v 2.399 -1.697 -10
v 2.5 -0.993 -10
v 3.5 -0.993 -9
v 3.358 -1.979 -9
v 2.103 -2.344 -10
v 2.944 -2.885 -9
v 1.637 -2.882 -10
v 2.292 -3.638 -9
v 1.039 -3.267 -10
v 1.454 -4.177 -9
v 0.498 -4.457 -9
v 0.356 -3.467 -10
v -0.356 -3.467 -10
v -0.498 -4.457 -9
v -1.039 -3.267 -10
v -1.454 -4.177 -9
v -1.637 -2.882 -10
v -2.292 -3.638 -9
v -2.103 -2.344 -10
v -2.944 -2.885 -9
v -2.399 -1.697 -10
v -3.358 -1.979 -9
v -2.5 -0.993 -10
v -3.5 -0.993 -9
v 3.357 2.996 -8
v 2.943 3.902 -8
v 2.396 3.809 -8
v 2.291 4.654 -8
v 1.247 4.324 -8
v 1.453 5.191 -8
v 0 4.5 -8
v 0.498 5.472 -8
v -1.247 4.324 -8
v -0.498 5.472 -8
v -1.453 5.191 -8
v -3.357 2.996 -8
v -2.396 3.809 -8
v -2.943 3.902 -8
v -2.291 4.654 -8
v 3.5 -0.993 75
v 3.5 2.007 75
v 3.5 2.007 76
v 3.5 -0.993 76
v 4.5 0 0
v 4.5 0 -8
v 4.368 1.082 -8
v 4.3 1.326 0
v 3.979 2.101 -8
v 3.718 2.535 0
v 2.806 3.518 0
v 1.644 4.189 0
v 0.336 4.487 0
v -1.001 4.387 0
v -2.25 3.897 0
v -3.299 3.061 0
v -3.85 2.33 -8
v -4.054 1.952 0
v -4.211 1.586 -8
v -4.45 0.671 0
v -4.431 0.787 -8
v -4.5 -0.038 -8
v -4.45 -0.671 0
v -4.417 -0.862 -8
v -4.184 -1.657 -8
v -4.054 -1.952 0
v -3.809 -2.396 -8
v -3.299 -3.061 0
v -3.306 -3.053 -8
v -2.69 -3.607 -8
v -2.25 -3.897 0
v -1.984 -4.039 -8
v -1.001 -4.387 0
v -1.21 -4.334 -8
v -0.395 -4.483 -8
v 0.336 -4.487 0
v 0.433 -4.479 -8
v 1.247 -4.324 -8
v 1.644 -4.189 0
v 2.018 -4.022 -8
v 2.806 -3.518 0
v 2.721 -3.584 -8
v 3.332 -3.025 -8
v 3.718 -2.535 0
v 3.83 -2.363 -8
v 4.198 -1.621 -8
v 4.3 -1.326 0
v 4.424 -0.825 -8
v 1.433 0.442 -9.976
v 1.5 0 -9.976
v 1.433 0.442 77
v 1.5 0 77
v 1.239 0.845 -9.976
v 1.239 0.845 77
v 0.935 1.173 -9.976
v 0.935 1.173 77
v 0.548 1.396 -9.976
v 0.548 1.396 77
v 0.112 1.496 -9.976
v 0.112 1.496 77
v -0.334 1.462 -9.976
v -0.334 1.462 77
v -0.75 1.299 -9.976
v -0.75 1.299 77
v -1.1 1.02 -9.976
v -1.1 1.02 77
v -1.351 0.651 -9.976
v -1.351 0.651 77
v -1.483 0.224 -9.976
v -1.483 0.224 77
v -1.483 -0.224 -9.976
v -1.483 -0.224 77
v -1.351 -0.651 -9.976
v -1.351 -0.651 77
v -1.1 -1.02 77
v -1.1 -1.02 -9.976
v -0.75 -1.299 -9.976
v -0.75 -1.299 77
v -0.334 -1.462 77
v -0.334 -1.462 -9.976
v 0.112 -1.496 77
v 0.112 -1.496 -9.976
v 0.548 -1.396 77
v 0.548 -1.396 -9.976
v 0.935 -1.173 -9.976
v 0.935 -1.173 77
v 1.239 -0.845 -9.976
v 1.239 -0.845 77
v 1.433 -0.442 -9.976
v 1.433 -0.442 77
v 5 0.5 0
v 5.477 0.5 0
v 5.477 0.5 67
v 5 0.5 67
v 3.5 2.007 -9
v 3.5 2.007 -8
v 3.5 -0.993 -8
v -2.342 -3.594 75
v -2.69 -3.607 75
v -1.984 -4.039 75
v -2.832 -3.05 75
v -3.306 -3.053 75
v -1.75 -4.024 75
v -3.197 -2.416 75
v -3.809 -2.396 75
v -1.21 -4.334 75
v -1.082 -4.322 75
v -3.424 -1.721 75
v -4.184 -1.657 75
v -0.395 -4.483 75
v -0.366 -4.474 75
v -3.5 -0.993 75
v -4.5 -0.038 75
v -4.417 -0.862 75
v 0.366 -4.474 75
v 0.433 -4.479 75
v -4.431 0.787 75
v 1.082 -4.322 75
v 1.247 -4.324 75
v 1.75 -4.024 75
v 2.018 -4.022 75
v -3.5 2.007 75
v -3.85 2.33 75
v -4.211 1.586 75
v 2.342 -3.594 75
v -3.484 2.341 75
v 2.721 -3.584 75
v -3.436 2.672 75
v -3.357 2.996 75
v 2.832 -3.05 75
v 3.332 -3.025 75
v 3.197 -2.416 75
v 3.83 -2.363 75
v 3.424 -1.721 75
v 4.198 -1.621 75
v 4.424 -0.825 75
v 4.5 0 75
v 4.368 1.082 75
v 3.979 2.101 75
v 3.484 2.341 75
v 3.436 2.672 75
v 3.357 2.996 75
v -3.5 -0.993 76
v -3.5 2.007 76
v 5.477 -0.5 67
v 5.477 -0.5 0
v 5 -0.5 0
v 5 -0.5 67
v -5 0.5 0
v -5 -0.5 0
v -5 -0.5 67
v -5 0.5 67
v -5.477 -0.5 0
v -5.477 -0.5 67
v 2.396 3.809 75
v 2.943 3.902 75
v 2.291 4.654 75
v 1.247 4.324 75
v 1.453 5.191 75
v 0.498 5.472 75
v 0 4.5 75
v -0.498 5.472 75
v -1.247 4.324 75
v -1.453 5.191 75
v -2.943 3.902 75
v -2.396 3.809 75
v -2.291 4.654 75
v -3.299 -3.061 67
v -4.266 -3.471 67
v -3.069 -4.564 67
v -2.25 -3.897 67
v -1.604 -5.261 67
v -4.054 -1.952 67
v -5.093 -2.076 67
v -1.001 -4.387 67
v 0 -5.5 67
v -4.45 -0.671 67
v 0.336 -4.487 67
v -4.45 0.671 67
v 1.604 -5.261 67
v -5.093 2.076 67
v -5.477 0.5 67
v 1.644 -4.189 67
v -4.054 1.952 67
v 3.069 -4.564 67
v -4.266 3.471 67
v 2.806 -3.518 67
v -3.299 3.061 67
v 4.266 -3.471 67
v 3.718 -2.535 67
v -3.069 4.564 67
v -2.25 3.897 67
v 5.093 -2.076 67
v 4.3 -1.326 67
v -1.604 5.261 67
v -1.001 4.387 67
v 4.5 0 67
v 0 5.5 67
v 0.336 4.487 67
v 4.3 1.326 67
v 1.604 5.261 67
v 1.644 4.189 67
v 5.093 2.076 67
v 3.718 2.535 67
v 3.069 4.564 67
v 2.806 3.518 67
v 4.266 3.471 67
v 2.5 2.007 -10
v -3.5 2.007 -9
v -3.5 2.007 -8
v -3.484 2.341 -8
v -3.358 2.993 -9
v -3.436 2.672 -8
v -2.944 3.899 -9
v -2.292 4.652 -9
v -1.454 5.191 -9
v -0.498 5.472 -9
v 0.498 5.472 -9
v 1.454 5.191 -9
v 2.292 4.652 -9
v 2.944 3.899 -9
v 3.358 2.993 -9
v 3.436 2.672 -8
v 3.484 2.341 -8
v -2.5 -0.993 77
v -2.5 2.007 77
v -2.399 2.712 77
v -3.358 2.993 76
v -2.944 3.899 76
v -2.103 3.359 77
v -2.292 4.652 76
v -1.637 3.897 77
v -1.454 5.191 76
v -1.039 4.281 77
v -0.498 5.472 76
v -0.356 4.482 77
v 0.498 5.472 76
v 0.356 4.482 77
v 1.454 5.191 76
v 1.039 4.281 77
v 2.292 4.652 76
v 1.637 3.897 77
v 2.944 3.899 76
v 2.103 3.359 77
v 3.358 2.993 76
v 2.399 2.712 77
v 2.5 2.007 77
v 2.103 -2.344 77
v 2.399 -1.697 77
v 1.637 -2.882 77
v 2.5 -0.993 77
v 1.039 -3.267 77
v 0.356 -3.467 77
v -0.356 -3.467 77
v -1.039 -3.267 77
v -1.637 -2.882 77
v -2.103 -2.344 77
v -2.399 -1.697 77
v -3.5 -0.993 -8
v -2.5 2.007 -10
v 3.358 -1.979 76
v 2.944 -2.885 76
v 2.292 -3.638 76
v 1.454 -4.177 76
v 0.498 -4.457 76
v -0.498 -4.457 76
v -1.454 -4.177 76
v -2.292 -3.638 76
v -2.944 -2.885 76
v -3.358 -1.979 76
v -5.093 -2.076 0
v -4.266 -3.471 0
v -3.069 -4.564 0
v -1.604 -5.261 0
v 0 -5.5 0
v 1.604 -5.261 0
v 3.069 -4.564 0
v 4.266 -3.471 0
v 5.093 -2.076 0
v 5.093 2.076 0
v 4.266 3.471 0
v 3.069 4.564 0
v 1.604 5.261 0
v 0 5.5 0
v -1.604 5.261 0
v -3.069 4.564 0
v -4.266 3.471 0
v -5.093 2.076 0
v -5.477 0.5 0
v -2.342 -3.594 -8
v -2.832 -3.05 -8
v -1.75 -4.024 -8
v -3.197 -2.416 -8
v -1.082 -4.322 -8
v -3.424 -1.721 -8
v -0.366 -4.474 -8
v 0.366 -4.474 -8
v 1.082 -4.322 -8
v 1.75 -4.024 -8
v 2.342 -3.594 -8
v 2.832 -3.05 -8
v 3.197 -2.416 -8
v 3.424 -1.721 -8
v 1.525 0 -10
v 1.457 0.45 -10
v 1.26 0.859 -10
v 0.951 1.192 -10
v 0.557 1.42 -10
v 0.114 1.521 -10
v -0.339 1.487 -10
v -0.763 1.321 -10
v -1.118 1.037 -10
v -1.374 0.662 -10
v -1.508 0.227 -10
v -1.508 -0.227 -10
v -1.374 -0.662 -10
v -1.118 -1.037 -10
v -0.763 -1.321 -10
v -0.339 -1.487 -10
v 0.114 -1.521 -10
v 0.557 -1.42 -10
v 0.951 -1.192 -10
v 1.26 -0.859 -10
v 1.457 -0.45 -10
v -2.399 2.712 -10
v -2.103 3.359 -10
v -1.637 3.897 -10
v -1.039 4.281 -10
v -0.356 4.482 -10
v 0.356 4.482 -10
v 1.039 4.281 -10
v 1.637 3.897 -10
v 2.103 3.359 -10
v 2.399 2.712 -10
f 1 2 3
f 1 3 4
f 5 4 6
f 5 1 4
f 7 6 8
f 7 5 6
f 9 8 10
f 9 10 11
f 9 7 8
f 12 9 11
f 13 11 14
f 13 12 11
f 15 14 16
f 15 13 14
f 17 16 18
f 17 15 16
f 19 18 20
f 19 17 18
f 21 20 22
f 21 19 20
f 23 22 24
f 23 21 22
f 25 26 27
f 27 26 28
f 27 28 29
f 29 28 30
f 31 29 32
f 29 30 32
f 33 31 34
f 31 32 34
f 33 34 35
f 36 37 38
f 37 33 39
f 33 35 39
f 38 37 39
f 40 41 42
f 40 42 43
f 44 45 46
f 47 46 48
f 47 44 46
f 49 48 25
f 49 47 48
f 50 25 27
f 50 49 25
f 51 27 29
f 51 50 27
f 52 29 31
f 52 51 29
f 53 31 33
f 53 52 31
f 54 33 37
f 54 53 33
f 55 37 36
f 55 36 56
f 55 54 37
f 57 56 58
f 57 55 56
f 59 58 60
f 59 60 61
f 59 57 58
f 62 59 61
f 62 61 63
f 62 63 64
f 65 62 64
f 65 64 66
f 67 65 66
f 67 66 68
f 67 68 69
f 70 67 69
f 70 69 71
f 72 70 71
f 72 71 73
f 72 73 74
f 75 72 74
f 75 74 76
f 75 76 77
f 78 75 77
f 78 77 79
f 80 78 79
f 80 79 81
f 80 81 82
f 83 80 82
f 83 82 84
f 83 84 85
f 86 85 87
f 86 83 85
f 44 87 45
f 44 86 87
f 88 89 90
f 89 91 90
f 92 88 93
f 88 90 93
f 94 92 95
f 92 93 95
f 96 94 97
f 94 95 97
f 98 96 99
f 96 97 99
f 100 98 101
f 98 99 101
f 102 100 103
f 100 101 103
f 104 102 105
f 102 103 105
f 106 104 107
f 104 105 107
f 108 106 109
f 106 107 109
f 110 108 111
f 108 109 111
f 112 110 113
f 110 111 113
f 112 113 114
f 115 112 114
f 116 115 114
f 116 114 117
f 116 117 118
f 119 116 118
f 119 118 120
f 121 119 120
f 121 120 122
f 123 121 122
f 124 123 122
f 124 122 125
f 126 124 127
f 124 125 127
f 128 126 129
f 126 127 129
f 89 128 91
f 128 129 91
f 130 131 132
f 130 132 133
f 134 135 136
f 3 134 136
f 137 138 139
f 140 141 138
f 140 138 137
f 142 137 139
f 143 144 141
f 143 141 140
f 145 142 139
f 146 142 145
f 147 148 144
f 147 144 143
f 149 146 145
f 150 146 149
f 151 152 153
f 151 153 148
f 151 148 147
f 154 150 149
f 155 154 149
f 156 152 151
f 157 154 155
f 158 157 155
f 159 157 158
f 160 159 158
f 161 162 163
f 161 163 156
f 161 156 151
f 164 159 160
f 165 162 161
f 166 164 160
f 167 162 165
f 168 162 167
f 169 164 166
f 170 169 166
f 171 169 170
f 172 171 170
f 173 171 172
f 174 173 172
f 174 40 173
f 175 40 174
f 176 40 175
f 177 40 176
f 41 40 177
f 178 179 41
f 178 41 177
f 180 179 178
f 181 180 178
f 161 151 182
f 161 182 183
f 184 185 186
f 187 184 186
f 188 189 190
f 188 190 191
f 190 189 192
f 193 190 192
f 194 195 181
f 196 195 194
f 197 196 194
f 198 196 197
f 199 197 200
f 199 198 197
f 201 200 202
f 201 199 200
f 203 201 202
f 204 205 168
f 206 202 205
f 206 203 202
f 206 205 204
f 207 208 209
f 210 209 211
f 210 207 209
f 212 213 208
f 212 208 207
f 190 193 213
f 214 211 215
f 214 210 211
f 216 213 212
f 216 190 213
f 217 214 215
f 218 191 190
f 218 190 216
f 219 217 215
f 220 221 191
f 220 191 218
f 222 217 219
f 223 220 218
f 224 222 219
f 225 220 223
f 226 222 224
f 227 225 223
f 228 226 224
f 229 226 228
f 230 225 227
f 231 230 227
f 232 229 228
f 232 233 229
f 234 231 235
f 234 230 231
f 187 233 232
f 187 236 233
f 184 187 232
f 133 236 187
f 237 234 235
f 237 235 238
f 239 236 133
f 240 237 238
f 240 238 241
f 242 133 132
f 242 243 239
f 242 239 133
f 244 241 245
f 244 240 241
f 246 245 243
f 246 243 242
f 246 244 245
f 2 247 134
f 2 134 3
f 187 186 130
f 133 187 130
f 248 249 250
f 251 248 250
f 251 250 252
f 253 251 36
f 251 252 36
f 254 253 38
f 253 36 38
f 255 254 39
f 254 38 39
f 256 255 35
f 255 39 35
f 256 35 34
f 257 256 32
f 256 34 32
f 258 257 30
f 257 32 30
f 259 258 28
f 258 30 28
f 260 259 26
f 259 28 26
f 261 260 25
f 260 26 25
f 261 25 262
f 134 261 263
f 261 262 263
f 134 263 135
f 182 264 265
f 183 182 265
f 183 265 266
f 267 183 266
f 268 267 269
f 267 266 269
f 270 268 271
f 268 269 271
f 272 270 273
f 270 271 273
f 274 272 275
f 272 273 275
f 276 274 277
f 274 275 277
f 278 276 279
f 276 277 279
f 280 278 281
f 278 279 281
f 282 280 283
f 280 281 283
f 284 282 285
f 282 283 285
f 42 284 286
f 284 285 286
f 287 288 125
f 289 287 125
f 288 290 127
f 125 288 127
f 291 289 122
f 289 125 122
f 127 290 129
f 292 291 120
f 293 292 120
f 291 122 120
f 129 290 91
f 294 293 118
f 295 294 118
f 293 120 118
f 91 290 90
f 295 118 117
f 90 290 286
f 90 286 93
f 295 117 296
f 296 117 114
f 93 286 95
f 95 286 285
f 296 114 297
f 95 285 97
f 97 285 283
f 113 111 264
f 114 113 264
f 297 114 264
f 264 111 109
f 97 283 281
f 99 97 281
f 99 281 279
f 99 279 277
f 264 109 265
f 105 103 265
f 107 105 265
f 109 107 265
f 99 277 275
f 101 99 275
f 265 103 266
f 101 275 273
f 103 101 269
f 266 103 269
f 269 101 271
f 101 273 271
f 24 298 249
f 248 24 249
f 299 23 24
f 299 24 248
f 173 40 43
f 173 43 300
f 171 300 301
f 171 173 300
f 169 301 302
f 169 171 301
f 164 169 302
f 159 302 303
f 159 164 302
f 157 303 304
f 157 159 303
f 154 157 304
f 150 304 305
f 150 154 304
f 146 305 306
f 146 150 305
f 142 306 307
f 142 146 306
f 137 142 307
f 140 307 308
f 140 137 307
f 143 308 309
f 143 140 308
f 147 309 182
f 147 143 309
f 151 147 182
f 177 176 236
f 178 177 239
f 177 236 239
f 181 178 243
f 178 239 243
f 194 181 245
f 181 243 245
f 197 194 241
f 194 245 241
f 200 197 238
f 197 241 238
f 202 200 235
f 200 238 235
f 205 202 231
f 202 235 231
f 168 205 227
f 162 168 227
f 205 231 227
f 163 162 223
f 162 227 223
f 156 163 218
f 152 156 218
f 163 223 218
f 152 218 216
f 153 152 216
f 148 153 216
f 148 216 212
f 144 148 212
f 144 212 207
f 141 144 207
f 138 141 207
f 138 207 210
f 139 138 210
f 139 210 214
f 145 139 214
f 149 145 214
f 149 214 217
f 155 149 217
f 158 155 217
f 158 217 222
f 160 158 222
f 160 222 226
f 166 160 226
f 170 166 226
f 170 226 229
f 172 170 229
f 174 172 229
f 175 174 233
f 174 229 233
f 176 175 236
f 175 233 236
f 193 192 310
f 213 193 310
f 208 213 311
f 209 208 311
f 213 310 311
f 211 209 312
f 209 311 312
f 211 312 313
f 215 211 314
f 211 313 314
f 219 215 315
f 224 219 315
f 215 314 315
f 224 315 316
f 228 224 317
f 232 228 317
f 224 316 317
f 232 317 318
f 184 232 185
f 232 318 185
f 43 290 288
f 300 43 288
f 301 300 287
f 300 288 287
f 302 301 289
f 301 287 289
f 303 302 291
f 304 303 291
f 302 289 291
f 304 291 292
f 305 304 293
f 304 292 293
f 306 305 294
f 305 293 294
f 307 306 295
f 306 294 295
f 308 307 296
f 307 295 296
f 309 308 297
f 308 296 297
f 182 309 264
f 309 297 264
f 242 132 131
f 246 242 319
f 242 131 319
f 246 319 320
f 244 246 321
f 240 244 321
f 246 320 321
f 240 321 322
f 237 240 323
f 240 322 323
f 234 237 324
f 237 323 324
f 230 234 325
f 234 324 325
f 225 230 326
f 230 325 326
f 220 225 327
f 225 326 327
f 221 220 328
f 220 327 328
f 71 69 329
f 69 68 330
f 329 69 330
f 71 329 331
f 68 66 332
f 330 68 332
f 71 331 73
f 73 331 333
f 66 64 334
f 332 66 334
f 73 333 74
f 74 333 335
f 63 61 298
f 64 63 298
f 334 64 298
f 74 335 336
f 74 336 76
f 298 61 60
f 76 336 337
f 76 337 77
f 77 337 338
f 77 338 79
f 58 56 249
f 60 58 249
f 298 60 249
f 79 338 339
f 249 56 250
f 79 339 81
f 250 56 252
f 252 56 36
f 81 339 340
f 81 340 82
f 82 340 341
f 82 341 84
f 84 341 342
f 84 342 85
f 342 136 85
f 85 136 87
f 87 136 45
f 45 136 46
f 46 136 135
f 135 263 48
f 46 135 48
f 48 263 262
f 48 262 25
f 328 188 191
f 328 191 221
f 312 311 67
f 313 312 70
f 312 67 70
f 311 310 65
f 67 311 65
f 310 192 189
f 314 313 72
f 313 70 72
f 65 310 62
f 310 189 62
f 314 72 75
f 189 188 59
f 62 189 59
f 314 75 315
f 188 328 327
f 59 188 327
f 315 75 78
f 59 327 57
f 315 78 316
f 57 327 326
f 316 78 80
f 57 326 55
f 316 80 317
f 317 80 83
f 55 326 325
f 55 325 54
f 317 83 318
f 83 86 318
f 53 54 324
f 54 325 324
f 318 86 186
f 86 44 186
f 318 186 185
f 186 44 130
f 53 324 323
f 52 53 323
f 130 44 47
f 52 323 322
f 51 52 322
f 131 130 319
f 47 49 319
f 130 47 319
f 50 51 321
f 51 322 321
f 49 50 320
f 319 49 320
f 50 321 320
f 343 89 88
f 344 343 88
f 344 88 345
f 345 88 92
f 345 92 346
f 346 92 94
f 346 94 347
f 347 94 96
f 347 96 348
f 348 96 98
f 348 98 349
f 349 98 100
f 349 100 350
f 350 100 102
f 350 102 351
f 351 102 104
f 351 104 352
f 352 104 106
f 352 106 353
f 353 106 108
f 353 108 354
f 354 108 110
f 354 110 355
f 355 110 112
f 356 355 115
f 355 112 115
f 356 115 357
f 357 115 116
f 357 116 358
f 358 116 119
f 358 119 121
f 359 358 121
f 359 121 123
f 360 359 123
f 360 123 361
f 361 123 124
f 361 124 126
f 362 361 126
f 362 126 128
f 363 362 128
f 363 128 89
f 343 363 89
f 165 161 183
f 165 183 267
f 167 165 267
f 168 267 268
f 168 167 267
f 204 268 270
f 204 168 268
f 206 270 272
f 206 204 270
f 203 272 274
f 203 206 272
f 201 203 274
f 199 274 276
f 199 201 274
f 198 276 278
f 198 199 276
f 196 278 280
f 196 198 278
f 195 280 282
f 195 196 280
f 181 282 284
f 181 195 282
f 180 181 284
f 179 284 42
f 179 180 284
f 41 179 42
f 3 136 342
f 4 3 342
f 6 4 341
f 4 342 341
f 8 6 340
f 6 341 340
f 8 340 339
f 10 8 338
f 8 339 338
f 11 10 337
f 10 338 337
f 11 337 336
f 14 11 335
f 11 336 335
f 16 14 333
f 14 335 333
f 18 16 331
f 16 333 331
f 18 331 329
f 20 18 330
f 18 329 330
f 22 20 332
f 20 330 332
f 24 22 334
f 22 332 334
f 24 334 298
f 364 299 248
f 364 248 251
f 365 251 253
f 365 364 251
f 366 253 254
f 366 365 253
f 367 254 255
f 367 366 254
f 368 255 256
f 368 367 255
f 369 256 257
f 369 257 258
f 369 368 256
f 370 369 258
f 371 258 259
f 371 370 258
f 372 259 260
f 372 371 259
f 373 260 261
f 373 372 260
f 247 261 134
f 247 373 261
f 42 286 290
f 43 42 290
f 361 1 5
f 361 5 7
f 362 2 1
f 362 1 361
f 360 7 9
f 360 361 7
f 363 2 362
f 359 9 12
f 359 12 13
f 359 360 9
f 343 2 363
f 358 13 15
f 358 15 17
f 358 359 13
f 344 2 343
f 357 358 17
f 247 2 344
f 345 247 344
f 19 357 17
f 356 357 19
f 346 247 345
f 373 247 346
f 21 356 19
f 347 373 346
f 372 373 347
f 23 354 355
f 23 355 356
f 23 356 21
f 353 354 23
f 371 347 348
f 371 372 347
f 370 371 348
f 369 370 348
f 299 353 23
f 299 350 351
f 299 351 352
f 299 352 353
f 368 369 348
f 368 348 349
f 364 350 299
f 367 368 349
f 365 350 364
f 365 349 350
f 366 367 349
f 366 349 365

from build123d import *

# Parameters (mm, degrees)
SKETCH1_R                       = 5.5
BOSS_EXTRUDE1_DEPTH             = 67
SKETCH2_W                       = 1
SKETCH2_H                       = 1
CUT_EXTRUDE1_DEPTH              = 67
SKETCH3_R                       = 4.5
BOSS_EXTRUDE2_DEPTH             = 8
BOSS_EXTRUDE3_DEPTH             = 2
CHAMFER1_SIZE                   = 1
CHAMFER1_OF_MIRROR1_SIZE        = 1
F_3_0MM_DOWEL_HOLE1_D           = 3
F_3_0MM_DOWEL_HOLE1_CSINK_D     = 3.05
F_3_0MM_DOWEL_HOLE1_CSINK_ANGLE = 92


with BuildPart() as part:
    # Sketch1 → Boss-Extrude1 (new body)
    with BuildSketch(Plane.XY):
        Circle(SKETCH1_R)
    extrude(amount=BOSS_EXTRUDE1_DEPTH)

    # Sketch2 → Cut-Extrude1 (cut)
    with BuildSketch(Plane(origin=(0, 0, 0), x_dir=(-1, 0, 0), z_dir=(0, 0, -1))):
        with Locations((5.5, 0)):
            Rectangle(SKETCH2_W, SKETCH2_H)
        with Locations((-5.5, 0)):
            Rectangle(SKETCH2_W, SKETCH2_H)
    extrude(amount=-CUT_EXTRUDE1_DEPTH, mode=Mode.SUBTRACT)

    # Sketch3 → Boss-Extrude2 (add)
    with BuildSketch(Plane.XY.offset(67)):
        Circle(SKETCH3_R)
    boss_extrude2 = extrude(amount=BOSS_EXTRUDE2_DEPTH)

    # Sketch4 → Boss-Extrude3 (add)
    with BuildSketch(Plane.XY.offset(75)):
        with BuildLine():
            Line((-3.5, -0.992829401), (-3.5, 2.007170599))
            ThreePointArc((-3.5, 2.007170599), (0, 5.507170599), (3.5, 2.007170599))
            Line((3.5, 2.007170599), (3.5, -0.992829401))
            ThreePointArc((3.5, -0.992829401), (0, -4.492829401), (-3.5, -0.992829401))
        make_face()
    boss_extrude3 = extrude(amount=BOSS_EXTRUDE3_DEPTH)

    # Chamfer1
    chamfer1_edges = [part.edges().sort_by_distance(p)[0] for p in [
        (0, -4.492829401, 77),
        (3.5, 0.507170599, 77),
        (0, 5.507170599, 77),
        (-3.5, 0.507170599, 77),
    ]]
    chamfer(chamfer1_edges, length=CHAMFER1_SIZE)

    # Mirror1: Boss-Extrude2, Boss-Extrude3 across plane
    add(boss_extrude2.mirror(Plane.XY.offset(33.5)))
    add(boss_extrude3.mirror(Plane.XY.offset(33.5)))

    # Chamfer1 of Mirror1
    chamfer1_of_mirror1_edges = [part.edges().sort_by_distance(p)[0] for p in [
        (0, -4.492829401, -10),
        (3.5, 0.507170599, -10),
        (0, 5.507170599, -10),
        (-3.5, 0.507170599, -10),
    ]]
    chamfer(chamfer1_of_mirror1_edges, length=CHAMFER1_OF_MIRROR1_SIZE)

    # Ø3.0mm Dowel Hole1 (through all)
    with Locations(Plane(origin=(0, 0, -10), x_dir=(-1, 0, 0), z_dir=(0, 0, -1))):
        with Locations((0, 0)):
            CounterSinkHole(F_3_0MM_DOWEL_HOLE1_D / 2, F_3_0MM_DOWEL_HOLE1_CSINK_D / 2, counter_sink_angle=F_3_0MM_DOWEL_HOLE1_CSINK_ANGLE)


solid = part.part
